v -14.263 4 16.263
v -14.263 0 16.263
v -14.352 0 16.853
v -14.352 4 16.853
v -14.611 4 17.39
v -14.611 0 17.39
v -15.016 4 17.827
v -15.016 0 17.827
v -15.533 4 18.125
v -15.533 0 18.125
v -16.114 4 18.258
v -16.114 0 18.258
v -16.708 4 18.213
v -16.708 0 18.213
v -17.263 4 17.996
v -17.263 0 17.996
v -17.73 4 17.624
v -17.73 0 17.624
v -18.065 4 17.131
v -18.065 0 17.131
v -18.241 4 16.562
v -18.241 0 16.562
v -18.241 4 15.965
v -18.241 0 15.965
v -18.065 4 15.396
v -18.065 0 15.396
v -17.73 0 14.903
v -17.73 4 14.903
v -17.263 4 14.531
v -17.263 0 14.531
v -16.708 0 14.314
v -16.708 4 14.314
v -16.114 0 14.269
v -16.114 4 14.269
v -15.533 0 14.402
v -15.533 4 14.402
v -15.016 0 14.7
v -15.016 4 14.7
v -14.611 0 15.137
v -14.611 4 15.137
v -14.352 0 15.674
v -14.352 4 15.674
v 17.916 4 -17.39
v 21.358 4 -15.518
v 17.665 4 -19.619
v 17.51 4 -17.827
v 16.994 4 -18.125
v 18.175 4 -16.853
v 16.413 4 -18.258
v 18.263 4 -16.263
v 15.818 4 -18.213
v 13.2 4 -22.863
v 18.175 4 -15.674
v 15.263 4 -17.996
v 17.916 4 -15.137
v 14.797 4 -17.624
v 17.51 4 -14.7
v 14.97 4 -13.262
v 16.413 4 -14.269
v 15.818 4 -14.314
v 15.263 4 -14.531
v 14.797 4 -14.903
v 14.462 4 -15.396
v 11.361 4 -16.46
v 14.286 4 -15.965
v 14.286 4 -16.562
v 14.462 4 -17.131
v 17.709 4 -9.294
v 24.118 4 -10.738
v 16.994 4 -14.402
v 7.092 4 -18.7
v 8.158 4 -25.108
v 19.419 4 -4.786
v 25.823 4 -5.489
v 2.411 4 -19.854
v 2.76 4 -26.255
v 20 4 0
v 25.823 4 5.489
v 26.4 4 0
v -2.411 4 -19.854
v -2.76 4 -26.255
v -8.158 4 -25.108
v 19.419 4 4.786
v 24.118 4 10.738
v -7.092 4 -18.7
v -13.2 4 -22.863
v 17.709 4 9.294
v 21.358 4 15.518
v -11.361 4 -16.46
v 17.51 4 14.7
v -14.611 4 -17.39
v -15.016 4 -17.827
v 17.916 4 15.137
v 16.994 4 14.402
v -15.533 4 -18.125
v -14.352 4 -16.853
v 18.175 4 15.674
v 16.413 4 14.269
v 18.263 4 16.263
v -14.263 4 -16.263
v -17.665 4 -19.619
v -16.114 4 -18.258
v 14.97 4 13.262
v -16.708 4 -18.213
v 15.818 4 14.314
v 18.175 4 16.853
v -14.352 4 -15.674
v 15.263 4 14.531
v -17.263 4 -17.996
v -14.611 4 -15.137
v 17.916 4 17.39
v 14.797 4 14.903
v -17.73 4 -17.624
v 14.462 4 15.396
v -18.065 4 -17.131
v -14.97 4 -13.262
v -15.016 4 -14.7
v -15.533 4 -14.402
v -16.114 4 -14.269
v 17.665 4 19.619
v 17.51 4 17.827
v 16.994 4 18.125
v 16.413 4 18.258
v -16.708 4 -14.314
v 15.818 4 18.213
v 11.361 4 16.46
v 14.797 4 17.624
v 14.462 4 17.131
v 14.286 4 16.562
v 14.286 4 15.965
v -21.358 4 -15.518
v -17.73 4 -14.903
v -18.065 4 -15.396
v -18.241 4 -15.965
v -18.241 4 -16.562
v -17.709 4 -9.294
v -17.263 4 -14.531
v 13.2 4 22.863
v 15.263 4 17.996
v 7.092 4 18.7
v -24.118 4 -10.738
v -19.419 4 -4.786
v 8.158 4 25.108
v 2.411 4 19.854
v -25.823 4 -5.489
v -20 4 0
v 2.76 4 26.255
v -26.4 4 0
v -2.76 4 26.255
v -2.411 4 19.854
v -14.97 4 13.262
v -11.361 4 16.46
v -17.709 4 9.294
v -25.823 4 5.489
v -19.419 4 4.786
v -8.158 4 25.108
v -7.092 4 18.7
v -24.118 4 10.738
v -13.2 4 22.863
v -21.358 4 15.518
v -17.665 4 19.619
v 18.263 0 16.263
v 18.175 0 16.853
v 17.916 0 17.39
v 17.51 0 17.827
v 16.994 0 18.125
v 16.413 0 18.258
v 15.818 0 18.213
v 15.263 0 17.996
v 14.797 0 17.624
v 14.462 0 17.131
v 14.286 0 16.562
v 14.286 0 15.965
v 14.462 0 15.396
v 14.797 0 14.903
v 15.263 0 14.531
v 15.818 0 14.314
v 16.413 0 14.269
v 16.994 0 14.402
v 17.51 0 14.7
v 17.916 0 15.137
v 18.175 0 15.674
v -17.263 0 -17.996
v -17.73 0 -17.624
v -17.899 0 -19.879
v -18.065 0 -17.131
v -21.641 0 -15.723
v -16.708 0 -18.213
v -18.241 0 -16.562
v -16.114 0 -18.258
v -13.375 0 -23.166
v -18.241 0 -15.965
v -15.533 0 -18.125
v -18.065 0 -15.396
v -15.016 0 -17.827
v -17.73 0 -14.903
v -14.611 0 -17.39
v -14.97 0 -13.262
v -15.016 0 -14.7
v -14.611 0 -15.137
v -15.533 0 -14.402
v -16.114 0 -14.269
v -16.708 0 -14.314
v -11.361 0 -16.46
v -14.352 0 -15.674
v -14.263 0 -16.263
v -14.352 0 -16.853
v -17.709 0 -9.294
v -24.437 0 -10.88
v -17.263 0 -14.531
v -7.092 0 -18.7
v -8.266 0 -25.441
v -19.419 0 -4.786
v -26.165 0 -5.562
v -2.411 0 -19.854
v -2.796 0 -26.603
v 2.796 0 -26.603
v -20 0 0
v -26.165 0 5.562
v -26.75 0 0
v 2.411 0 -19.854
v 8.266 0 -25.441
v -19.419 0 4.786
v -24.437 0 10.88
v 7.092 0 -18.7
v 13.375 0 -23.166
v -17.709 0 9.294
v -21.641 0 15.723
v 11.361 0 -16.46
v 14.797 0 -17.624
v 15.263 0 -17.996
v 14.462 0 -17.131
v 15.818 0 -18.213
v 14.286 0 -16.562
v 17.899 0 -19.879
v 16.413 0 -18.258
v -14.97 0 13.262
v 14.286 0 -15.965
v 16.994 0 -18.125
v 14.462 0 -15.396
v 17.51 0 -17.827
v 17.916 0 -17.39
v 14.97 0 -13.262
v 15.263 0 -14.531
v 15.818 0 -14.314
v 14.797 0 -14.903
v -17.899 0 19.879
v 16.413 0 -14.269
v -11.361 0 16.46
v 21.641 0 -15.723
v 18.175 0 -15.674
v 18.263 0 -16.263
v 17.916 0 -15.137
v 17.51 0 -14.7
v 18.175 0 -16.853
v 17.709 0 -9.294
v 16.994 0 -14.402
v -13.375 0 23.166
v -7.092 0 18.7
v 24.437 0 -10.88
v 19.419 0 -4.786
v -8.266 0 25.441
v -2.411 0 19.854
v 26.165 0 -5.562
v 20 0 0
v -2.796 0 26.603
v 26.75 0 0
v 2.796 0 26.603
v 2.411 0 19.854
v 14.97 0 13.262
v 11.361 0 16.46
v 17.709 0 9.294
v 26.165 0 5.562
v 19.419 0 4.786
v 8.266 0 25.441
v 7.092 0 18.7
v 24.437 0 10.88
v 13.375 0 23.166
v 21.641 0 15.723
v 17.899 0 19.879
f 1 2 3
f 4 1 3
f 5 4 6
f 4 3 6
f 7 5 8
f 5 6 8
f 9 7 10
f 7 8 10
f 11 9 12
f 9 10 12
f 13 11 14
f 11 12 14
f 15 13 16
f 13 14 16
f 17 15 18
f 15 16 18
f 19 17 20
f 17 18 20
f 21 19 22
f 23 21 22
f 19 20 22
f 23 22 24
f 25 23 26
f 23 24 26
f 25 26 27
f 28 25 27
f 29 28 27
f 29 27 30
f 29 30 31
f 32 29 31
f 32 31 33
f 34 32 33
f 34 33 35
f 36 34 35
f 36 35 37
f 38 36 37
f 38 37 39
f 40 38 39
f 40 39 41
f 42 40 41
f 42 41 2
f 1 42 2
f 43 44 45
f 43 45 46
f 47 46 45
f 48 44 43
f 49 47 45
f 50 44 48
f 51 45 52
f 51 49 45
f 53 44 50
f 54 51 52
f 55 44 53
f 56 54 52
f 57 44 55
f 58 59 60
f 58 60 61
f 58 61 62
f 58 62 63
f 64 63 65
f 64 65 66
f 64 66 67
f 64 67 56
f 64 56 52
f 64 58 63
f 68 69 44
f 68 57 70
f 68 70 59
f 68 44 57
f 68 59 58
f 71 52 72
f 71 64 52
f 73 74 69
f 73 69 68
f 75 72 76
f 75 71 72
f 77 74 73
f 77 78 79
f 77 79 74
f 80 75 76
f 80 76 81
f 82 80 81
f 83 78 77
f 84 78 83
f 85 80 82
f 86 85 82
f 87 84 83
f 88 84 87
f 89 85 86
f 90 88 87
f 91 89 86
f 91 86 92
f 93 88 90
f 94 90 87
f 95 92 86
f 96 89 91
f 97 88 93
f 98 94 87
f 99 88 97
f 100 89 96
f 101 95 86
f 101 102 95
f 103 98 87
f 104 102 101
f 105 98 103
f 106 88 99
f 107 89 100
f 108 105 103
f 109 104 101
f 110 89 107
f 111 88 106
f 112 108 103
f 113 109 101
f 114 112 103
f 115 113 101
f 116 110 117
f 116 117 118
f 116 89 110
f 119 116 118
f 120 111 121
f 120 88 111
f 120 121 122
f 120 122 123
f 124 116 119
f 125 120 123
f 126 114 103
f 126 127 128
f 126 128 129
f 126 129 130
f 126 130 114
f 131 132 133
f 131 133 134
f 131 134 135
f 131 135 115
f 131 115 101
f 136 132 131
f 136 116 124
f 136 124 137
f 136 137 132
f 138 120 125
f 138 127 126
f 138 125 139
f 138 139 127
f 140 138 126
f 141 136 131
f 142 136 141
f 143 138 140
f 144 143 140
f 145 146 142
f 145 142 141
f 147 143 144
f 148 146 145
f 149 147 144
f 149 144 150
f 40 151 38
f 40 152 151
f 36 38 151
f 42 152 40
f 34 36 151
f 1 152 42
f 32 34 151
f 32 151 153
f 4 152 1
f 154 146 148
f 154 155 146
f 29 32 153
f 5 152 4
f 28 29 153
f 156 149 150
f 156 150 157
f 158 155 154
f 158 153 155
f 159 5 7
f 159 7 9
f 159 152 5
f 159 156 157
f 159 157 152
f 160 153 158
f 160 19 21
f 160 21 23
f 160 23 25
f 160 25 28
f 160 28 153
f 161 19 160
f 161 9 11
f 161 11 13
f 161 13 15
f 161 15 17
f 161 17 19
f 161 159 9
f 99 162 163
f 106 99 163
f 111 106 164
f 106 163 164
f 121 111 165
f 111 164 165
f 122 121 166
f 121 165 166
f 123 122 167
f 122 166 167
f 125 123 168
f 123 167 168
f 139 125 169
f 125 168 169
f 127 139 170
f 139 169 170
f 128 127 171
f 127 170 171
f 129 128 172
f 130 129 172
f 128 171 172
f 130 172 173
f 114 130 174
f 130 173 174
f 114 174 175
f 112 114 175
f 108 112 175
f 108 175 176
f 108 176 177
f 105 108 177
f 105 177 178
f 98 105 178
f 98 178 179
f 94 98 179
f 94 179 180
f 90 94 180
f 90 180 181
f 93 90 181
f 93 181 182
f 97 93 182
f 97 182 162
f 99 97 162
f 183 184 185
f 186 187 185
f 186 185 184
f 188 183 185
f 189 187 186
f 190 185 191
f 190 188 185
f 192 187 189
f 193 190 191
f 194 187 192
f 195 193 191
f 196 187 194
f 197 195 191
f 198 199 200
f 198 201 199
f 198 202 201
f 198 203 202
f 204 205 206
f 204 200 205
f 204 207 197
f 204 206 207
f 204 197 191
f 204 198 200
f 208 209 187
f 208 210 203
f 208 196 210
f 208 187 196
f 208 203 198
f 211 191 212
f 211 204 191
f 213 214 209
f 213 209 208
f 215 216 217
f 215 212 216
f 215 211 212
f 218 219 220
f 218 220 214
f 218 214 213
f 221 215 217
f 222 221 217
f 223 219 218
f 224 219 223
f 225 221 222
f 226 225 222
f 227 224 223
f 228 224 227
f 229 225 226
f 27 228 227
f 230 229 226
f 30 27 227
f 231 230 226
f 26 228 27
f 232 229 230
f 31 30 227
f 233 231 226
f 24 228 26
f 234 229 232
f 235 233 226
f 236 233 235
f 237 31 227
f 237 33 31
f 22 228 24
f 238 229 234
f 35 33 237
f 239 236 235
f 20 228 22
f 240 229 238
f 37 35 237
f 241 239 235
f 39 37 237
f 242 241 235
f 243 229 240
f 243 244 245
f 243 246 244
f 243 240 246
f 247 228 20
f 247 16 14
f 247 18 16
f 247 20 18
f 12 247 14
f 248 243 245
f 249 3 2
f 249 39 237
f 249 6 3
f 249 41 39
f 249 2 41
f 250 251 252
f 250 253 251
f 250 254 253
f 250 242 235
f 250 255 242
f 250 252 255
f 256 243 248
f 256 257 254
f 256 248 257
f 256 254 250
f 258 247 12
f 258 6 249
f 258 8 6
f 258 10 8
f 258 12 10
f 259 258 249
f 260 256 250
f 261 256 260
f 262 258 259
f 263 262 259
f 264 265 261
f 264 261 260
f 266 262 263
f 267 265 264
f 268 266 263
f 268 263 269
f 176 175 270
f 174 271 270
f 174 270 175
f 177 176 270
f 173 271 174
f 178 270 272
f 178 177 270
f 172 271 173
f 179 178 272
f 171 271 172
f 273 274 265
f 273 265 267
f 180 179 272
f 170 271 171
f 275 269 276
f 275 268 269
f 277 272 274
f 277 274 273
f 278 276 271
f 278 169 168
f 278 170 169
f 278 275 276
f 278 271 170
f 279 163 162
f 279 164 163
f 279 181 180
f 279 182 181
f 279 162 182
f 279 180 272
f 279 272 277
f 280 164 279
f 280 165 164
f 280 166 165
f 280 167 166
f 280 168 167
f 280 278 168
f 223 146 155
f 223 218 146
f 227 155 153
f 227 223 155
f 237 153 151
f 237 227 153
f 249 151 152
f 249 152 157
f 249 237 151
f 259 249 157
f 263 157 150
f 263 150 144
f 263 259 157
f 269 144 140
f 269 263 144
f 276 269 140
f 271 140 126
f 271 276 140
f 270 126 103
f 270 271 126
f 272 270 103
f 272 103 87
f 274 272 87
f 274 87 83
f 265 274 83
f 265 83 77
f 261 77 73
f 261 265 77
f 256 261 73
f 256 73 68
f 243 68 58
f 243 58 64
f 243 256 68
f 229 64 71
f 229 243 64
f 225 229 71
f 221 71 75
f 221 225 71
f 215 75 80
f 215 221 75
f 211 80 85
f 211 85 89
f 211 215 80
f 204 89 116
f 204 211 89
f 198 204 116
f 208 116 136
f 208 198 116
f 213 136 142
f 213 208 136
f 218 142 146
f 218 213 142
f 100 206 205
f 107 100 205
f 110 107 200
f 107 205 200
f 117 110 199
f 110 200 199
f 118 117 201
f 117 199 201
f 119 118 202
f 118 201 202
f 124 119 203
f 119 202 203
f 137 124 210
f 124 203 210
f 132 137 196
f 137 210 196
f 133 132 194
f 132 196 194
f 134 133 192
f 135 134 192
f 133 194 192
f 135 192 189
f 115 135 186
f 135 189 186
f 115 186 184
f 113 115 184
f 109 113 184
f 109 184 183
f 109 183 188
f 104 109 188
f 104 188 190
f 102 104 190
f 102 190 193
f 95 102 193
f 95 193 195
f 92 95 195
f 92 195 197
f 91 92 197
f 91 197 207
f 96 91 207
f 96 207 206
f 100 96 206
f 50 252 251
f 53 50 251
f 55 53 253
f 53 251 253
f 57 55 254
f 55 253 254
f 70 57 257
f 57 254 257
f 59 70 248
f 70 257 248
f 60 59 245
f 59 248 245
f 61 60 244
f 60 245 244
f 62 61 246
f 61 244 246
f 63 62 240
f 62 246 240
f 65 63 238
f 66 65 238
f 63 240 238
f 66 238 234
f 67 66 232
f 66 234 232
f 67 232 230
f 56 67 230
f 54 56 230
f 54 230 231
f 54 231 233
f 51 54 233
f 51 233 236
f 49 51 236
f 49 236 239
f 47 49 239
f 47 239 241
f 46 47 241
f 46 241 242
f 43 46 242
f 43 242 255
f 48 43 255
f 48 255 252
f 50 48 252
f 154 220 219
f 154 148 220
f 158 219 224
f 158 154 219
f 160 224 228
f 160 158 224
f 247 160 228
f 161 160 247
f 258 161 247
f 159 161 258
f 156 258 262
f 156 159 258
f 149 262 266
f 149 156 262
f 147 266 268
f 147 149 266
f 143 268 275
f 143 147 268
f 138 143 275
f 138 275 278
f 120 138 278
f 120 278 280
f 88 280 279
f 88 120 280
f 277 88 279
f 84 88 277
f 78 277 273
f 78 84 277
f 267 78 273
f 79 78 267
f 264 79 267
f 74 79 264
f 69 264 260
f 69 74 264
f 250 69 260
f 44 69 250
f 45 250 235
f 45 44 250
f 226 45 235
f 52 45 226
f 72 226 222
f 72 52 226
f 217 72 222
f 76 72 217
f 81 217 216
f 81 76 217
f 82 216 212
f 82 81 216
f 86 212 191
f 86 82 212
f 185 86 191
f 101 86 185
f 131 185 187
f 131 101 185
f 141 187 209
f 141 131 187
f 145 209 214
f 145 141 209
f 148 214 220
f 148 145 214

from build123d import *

# Parameters (mm, degrees)
SKETCH3_R          = 2
CUT_EXTRUDE1_DEPTH = 5


with BuildPart() as part:
    # Sketch1 → Revolve1 (revolve)
    with BuildSketch(Plane.XY):
        Polygon((-26.75, 0), (-26.400045346, 4), (-20, 4), (-20, 0), align=None)
    revolve(axis=Axis((0, 0, 0), (0, 1, 0)))

    # Sketch3 → Cut-Extrude1 (cut, through all)
    with BuildSketch(Plane.XZ):
        with Locations((-16.263455967, 16.263455967)):
            Circle(SKETCH3_R)
        with Locations((16.263455967, 16.263455967)):
            Circle(SKETCH3_R)
        with Locations((-16.263455967, -16.263455967)):
            Circle(SKETCH3_R)
        with Locations((16.263455967, -16.263455967)):
            Circle(SKETCH3_R)
    extrude(amount=-CUT_EXTRUDE1_DEPTH, mode=Mode.SUBTRACT)


solid = part.part
